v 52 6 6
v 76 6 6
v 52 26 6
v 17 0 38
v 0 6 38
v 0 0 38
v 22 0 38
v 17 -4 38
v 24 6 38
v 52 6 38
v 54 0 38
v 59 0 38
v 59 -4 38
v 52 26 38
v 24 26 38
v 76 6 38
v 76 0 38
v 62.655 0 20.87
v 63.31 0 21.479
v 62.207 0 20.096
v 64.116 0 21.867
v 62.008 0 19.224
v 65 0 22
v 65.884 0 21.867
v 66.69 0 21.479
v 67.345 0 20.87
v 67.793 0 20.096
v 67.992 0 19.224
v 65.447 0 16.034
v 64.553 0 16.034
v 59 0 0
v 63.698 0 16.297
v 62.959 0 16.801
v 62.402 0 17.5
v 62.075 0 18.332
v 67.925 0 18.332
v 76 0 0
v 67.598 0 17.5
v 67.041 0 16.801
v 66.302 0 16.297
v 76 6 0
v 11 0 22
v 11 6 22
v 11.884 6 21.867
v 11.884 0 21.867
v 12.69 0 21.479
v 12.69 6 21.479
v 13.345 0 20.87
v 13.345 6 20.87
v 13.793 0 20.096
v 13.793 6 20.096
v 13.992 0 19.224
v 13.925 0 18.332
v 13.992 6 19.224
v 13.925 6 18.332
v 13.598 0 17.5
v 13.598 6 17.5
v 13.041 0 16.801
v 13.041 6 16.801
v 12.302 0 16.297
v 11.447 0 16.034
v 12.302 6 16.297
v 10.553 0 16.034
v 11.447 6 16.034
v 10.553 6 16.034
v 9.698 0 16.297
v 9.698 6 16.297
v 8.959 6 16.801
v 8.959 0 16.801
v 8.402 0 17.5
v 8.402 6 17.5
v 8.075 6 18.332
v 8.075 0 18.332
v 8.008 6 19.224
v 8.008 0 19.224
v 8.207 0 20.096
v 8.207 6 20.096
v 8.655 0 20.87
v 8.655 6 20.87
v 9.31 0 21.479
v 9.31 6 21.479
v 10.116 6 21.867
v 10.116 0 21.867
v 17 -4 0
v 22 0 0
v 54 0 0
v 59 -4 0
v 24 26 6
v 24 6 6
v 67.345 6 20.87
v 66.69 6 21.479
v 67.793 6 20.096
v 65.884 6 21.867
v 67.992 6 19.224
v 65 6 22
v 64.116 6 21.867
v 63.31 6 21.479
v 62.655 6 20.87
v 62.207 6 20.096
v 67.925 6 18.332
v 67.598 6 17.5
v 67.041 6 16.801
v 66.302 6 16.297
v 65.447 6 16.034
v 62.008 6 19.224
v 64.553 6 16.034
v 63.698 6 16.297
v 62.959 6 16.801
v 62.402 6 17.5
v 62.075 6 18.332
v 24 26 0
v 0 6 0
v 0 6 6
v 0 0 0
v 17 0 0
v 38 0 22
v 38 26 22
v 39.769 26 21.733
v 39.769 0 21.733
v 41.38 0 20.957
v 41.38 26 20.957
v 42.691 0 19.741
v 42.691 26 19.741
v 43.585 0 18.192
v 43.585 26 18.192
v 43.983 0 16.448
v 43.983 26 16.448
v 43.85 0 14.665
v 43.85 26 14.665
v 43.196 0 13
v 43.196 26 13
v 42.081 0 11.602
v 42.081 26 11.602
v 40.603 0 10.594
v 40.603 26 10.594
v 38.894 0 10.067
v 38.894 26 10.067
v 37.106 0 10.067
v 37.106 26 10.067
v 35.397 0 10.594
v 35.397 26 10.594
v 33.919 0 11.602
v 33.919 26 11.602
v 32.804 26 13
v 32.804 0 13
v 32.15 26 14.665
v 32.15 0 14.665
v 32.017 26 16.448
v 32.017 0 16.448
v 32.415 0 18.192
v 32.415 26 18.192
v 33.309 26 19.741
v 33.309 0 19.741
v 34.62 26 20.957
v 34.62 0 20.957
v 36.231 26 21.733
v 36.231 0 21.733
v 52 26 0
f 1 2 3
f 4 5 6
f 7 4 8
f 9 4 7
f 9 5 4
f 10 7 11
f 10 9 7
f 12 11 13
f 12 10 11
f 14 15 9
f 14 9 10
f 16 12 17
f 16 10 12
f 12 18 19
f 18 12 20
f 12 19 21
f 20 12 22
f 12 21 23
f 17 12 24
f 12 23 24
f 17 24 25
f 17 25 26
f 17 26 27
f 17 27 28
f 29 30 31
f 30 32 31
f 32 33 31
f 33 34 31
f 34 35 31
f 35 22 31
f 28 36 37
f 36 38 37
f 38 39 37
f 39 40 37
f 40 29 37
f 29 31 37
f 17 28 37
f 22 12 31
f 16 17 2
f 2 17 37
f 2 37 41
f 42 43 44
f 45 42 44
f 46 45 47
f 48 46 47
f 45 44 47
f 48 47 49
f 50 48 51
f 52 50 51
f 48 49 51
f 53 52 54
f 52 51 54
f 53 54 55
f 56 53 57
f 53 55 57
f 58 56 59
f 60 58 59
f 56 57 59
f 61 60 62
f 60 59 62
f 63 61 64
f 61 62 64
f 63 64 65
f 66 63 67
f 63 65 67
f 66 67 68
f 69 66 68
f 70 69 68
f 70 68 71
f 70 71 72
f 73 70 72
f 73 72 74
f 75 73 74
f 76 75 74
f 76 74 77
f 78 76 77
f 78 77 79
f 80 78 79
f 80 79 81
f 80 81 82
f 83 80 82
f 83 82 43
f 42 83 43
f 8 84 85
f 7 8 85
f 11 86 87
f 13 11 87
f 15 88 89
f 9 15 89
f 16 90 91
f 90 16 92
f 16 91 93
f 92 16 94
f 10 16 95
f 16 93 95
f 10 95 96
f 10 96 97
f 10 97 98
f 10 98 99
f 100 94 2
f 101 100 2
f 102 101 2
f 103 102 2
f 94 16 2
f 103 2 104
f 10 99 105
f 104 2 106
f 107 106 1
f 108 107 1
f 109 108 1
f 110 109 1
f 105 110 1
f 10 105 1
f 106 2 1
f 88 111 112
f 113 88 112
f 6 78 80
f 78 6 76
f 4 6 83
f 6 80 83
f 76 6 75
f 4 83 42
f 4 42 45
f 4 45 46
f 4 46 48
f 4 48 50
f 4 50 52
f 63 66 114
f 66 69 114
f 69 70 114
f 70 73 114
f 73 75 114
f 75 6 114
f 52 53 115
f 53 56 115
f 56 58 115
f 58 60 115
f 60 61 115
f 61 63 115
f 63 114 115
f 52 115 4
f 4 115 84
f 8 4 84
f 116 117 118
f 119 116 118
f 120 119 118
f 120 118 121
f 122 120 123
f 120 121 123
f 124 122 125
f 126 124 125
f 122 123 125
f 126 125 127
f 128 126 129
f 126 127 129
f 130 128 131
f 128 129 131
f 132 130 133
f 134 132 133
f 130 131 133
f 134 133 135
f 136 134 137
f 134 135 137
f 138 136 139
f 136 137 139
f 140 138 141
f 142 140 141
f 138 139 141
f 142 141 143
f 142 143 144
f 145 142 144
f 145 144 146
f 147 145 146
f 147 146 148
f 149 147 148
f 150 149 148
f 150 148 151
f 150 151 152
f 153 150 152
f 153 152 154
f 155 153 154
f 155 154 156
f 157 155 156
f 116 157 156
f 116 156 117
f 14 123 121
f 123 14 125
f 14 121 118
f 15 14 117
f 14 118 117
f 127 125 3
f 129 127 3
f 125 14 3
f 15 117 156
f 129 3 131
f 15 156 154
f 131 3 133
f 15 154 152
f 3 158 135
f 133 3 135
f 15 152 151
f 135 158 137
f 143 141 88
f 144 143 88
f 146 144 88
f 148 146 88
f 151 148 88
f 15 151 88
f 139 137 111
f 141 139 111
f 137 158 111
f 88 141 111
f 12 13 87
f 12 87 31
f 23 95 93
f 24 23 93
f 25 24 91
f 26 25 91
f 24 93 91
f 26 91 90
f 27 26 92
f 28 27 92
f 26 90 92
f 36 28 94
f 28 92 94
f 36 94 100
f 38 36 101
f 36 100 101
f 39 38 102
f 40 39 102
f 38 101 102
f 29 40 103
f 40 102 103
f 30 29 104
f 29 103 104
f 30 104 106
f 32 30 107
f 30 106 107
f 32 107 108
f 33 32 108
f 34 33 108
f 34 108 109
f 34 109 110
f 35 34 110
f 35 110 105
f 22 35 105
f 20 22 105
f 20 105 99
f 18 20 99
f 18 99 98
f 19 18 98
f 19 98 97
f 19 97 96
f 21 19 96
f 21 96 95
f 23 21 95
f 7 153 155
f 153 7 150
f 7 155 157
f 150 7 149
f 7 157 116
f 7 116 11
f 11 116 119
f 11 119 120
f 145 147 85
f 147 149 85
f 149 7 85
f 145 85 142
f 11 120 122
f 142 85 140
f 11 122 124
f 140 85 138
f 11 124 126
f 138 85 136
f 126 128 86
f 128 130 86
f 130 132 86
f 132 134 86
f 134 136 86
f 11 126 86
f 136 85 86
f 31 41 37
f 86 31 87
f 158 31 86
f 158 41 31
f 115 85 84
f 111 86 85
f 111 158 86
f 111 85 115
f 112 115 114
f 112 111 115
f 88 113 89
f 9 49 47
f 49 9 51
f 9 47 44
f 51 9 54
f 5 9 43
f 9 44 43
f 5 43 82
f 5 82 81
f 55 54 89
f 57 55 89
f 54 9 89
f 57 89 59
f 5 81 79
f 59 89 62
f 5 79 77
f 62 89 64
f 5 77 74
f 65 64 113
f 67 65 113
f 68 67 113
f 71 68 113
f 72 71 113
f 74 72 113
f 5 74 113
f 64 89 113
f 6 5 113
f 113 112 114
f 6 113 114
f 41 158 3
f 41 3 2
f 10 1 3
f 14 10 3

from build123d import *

# Parameters (mm, degrees)
BOSS_EXTRUDE2_DEPTH = 38
BOSS_EXTRUDE3_DEPTH = 6
SKETCH6_R           = 6
SKETCH6_R_2         = 3
CUT_EXTRUDE1_DEPTH  = 91.111042609


with BuildPart() as part:
    # Sketch1 → Boss-Extrude2 (new body)
    with BuildSketch(Plane.XY):
        Polygon((52, 26), (24, 26), (24, 6), (0, 6), (0, 0), (17, 0), (17, -4), (22, 0), (54, 0), (59, -4), (59, 0), (76, 0), (76, 6), (52, 6), align=None)
    extrude(amount=BOSS_EXTRUDE2_DEPTH)

    # Sketch1<4> → Boss-Extrude3 (add)
    with BuildSketch(Plane.XY):
        Polygon((24, 6), (24, 26), (0, 6), align=None)
        Polygon((76, 6), (52, 26), (52, 6), align=None)
    extrude(amount=BOSS_EXTRUDE3_DEPTH)

    # Sketch6 → Cut-Extrude1 (cut, through all)
    with BuildSketch(Plane(origin=(0, 26, 0), x_dir=(1, 0, 0), z_dir=(0, 1, 0))):
        with Locations((38, -16)):
            Circle(SKETCH6_R)
        with Locations((65, -19)):
            Circle(SKETCH6_R_2)
        with Locations((11, -19)):
            Circle(SKETCH6_R_2)
    extrude(amount=-CUT_EXTRUDE1_DEPTH, mode=Mode.SUBTRACT)


solid = part.part
